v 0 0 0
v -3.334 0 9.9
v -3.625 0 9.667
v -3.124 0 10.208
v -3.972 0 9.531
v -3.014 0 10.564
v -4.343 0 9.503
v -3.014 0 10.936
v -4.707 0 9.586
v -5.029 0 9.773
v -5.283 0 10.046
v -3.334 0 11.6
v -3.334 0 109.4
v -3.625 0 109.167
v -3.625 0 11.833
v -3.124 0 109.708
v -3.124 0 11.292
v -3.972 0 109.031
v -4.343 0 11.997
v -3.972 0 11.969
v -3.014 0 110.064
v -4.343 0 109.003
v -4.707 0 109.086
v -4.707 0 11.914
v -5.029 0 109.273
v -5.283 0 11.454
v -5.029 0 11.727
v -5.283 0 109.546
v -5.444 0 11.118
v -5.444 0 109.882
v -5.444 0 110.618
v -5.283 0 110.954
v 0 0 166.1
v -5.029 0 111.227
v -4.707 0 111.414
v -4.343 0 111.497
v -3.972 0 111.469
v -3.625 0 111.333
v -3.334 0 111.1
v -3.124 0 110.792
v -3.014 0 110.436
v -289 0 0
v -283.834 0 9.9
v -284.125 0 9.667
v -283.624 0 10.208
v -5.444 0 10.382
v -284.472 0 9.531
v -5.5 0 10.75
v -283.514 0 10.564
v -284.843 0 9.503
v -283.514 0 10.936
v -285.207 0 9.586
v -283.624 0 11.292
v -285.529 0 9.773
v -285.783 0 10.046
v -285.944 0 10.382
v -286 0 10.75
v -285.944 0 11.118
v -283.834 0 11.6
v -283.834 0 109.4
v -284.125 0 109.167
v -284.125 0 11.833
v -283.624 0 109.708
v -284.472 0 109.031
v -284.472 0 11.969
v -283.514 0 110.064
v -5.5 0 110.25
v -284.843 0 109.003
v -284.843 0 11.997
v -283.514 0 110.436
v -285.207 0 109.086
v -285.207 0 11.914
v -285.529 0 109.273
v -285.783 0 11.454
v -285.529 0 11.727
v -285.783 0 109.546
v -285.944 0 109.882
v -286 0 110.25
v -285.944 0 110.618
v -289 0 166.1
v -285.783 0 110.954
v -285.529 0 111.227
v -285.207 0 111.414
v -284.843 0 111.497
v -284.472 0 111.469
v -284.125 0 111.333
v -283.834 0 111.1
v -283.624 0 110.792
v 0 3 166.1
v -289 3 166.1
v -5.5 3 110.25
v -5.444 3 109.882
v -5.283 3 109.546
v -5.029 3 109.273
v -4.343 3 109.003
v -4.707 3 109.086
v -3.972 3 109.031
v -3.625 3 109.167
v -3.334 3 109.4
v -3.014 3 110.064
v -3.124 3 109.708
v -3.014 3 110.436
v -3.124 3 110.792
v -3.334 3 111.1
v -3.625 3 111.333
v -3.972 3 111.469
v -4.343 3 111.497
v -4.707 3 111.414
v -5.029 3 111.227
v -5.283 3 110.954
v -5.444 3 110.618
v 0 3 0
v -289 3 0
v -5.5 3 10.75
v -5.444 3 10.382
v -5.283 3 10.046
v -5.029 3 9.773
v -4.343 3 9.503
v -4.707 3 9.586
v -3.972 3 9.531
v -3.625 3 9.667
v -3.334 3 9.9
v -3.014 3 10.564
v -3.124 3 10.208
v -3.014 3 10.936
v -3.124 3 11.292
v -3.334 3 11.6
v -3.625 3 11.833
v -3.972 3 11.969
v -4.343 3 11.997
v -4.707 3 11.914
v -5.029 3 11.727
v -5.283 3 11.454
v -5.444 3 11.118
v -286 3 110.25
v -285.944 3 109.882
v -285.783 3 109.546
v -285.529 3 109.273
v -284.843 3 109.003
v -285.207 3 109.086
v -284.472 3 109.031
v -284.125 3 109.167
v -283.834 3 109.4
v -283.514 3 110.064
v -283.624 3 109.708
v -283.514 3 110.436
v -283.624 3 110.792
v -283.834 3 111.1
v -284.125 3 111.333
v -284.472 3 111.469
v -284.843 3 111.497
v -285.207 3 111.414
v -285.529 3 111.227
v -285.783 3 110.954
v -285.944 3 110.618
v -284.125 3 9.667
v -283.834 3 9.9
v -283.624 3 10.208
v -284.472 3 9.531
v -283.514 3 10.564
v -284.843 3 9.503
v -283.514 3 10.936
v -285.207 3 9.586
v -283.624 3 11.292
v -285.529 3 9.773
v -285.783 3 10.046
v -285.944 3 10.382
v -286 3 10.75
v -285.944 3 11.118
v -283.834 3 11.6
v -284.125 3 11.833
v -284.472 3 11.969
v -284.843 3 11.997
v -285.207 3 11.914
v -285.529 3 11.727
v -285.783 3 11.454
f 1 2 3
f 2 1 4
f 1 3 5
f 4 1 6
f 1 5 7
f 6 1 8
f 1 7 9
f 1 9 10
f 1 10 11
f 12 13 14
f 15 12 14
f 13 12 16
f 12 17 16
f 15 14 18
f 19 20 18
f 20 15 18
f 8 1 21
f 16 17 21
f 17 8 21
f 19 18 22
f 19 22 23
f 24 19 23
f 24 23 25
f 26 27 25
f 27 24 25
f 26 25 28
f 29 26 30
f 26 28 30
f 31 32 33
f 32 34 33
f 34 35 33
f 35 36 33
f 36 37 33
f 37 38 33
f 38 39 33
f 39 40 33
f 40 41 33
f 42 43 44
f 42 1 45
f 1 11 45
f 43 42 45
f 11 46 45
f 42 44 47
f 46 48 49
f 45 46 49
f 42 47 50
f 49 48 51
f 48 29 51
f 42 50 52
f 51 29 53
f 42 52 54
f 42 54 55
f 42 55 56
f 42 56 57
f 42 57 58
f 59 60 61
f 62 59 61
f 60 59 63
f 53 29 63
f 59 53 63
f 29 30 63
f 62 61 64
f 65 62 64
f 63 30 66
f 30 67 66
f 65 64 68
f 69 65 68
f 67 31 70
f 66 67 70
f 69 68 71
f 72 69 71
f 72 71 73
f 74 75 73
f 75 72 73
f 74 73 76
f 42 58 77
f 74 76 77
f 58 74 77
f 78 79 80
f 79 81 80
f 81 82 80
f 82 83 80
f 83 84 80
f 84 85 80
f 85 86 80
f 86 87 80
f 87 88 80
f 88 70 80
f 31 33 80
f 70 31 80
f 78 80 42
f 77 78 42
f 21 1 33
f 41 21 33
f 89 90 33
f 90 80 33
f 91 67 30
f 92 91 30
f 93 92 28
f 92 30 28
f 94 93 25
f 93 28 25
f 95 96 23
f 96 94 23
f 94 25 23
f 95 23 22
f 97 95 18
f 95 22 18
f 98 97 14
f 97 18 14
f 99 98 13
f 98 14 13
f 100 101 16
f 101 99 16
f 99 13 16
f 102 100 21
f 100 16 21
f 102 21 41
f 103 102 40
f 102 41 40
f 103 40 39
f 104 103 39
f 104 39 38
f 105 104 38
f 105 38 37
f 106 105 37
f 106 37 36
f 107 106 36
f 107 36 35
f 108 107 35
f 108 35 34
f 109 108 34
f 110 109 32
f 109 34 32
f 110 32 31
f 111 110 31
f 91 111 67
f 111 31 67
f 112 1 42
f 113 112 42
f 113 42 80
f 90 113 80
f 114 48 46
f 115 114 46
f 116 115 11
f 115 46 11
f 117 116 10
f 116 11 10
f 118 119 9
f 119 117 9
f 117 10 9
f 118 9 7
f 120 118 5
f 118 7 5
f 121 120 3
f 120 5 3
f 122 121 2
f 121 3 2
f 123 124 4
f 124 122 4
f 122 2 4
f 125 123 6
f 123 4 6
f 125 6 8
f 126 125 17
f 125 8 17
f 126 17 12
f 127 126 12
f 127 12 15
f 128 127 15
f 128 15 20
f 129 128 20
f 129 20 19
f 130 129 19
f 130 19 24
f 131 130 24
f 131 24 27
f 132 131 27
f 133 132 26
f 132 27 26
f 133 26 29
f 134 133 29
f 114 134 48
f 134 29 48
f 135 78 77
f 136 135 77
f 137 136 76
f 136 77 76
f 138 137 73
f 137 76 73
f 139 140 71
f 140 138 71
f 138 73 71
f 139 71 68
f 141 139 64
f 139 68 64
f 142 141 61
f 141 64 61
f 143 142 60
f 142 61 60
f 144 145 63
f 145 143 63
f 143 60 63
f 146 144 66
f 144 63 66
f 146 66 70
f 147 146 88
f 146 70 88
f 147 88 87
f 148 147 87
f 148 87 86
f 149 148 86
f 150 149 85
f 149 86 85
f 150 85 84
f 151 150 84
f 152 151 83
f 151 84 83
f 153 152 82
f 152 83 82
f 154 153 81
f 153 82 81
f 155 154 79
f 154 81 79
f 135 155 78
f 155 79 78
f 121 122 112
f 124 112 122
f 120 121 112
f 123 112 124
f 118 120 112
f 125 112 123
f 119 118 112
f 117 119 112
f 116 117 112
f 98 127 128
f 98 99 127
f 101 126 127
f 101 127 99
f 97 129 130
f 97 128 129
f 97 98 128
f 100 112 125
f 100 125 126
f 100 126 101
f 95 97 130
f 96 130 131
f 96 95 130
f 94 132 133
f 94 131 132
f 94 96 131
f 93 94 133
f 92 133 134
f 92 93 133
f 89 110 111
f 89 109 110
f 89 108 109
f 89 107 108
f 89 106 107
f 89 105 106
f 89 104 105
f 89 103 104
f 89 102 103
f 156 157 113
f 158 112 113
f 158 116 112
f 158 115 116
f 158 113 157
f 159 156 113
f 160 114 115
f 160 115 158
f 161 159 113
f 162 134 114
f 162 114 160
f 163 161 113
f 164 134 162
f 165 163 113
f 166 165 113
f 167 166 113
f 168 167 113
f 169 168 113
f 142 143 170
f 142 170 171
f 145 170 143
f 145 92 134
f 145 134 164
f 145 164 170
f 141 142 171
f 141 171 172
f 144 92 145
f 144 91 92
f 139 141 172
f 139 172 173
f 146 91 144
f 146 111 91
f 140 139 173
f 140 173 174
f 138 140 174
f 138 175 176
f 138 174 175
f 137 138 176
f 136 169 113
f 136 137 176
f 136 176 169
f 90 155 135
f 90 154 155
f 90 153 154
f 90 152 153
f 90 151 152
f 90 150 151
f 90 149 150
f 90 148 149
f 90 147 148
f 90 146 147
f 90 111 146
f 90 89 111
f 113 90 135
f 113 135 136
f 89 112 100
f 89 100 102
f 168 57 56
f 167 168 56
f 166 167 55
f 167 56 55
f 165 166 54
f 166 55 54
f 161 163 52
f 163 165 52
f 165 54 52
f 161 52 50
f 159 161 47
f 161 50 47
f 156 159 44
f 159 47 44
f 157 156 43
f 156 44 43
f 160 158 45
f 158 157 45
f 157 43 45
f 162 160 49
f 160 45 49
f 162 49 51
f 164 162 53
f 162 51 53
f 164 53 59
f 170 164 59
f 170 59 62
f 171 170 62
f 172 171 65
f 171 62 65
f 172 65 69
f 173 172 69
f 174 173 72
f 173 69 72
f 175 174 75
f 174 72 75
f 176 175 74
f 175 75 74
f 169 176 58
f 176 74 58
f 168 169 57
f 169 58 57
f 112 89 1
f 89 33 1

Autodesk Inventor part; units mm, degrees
ref_plane "YZ Plane" through (0, 0, 0) normal (1, 0, 0) x (0, 1, 0)
ref_plane "XZ Plane" through (0, 0, 0) normal (0, 1, 0) x (-1, 0, 0)
ref_plane "XY Plane" through (0, 0, 0) normal (0, 0, 1) x (1, 0, 0)
sketch "Sketch1" plane through (0, 0, 0) normal (0, 1, 0) x (-1, 0, 0)
  line L0 (0, 0) -> (289, 0)
  line L1 (289, 0) -> (289, 166.1)
  line L2 (289, 166.1) -> (0, 166.1)
  line L3 (0, 166.1) -> (0, 0)
  circle A0 centre (4.25, 10.75) radius 1.25
  circle A1 centre (4.25, 110.25) radius 1.25
  line L4 (144.5, 166.1) -> (144.5, 0) construction
  circle A2 centre (284.75, 10.75) radius 1.25
  circle A3 centre (284.75, 110.25) radius 1.25
  dimension "d0" = 289
  dimension "d1" = 166.1
  dimension "d4" = 2.5
  dimension "d5" = 4.25
  dimension "d6" = 10.75
  dimension "d7" = 2.5
  dimension "d8" = 4.25
  dimension "d9" = 99.5
extrude "Extrusion1" add sketch "Sketch1" along normal blind 3
equation "\"d7\" = d4"
equation "\"d8\" = d5"
properties part number "wall-front-outer"
